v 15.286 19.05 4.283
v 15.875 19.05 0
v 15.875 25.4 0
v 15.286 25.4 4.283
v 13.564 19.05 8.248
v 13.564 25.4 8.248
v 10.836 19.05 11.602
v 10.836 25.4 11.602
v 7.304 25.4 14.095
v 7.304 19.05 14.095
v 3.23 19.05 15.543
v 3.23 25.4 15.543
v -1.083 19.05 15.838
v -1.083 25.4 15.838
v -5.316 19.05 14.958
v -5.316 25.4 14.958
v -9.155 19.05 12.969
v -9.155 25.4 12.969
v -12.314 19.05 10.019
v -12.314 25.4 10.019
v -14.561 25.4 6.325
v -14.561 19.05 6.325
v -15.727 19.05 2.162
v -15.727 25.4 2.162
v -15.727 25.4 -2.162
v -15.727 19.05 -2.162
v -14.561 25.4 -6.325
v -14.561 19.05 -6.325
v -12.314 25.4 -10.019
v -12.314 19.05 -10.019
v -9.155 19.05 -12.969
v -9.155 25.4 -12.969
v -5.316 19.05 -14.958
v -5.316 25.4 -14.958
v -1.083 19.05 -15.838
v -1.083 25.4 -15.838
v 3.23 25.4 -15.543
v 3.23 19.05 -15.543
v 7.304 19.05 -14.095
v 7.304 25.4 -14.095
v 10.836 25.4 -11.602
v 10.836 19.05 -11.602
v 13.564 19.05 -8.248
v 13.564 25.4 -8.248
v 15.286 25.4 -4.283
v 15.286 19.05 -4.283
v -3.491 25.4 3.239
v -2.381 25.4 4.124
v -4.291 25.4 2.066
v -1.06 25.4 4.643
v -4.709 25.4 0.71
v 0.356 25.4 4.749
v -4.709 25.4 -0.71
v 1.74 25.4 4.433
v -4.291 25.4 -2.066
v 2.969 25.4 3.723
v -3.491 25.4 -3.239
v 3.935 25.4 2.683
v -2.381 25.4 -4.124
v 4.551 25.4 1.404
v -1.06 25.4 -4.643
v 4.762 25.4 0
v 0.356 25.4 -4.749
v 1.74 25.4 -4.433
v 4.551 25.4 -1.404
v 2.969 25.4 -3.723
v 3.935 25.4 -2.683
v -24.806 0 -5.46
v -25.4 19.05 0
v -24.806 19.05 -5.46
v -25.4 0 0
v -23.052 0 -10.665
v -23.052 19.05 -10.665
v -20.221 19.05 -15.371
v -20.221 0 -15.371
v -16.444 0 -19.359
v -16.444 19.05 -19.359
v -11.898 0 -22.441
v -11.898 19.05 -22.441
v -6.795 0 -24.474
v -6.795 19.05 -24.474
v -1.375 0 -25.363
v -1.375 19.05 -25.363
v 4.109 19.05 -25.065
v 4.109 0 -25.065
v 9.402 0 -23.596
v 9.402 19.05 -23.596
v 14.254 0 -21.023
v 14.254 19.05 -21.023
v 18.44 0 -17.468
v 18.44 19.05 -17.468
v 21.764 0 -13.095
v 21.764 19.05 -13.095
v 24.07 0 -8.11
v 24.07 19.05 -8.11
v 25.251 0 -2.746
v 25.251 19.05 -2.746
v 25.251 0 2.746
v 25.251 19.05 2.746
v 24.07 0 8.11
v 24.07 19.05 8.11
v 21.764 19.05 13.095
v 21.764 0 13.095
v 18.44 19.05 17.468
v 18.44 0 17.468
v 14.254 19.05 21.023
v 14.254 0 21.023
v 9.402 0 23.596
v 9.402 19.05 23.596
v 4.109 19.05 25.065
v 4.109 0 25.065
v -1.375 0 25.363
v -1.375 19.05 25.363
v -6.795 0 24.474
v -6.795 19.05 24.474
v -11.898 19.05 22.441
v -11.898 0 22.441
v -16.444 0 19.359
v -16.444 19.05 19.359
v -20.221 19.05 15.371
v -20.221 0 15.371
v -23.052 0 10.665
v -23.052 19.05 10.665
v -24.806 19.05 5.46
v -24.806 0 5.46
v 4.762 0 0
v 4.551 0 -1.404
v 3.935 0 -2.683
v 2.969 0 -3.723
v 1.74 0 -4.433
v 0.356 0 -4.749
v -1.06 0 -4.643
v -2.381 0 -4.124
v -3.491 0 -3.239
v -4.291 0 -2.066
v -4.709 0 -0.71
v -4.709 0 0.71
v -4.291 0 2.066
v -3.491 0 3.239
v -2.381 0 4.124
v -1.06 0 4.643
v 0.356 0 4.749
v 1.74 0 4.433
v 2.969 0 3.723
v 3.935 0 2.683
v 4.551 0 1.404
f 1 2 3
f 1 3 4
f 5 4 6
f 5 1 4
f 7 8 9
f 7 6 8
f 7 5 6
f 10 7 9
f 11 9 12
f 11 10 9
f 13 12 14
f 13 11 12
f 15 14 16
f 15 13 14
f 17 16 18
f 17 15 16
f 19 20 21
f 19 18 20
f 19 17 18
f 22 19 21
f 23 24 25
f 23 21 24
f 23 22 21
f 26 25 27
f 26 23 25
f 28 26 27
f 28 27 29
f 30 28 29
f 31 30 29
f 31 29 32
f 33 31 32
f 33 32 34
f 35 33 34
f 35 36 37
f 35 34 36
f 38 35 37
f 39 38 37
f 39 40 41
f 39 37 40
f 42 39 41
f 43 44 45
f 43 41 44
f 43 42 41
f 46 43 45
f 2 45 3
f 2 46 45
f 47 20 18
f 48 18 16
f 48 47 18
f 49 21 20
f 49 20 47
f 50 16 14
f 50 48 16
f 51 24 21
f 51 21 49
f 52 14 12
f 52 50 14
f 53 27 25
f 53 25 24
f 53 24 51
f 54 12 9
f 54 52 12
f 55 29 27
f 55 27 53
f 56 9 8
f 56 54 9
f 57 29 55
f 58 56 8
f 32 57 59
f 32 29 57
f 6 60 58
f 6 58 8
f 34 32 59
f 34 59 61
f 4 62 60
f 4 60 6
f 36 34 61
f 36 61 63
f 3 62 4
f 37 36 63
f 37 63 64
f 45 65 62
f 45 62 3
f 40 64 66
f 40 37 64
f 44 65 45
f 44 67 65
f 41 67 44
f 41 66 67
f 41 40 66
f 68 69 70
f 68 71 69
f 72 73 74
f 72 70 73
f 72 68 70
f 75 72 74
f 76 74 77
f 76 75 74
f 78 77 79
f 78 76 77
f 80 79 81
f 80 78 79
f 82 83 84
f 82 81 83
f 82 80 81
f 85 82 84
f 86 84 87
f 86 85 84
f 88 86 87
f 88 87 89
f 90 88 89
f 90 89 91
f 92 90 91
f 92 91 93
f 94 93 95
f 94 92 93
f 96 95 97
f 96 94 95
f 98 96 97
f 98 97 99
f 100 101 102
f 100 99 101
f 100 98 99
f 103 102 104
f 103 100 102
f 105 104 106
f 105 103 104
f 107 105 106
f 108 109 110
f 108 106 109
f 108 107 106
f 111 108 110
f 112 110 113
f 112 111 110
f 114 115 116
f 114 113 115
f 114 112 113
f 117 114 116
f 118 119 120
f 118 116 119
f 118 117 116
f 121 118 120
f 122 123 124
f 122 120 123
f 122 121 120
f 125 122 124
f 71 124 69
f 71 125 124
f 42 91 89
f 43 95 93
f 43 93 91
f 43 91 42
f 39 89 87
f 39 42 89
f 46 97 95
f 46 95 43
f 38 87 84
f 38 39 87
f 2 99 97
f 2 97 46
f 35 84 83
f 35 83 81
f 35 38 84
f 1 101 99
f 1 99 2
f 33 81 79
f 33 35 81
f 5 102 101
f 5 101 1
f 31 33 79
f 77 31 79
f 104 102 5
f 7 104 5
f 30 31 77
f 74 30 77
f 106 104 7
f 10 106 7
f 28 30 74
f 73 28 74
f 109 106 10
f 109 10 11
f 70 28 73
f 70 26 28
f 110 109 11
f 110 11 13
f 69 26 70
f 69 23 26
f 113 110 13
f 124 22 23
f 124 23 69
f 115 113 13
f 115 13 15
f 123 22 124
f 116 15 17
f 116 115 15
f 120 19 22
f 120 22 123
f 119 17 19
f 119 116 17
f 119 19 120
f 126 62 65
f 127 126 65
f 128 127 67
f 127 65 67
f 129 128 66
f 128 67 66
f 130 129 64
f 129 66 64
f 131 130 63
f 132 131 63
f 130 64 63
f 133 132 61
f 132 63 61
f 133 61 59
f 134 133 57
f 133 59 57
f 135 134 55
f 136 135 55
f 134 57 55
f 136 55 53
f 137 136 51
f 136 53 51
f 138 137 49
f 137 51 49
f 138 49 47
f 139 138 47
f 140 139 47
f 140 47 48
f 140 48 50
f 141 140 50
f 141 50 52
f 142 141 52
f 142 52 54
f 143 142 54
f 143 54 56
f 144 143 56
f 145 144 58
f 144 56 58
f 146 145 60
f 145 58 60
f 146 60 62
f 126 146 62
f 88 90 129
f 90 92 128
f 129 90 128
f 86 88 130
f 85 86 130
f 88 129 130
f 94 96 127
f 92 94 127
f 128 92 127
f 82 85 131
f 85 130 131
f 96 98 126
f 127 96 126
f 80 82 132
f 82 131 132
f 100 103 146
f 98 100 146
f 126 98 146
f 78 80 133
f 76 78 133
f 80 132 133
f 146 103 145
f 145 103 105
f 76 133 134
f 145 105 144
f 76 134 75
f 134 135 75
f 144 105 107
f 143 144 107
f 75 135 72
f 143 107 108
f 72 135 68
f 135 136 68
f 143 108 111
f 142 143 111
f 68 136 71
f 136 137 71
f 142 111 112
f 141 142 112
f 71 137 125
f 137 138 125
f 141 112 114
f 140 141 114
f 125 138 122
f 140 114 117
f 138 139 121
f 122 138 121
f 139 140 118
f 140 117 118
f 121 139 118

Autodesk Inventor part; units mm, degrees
ref_plane "YZ Plane" through (0, 0, 0) normal (1, 0, 0) x (0, 1, 0)
ref_plane "XZ Plane" through (0, 0, 0) normal (0, 1, 0) x (-1, 0, 0)
ref_plane "XY Plane" through (0, 0, 0) normal (0, 0, 1) x (1, 0, 0)
sketch "Sketch1" plane through (0, 0, 0) normal (0, 1, 0) x (-1, 0, 0)
  circle A0 centre (0, 0) radius 25.4
  dimension "d0" = 50.8
extrude "Extrusion1" add sketch "Sketch1" along normal blind 19.05
sketch "Sketch2" plane through (0, 19.05, 0) normal (0, 1, 0) x (1, 0, 0)
  circle A0 centre (0, 0) radius 15.875
  dimension "d3" = 31.75
extrude "Extrusion2" add sketch "Sketch2" along normal blind 6.35
sketch "Sketch3" plane through (0, 25.4, 0) normal (0, 1, 0) x (1, 0, 0)
  circle A0 centre (0, 0) radius 4.7625
  dimension "d6" = 9.525
extrude "Extrusion3" cut sketch "Sketch3" along normal blind 31.75
sketch "Sketch4" plane through (0, 25.4, 0) normal (0, 1, 0) x (1, 0, 0)
  circle A0 centre (0, 0) radius 4.7625
  dimension "d9" = 9.525
extrude "Extrusion4" cut sketch "Sketch4" against normal blind 31.75
properties part number "2 inch Diameter Belt Gear"
